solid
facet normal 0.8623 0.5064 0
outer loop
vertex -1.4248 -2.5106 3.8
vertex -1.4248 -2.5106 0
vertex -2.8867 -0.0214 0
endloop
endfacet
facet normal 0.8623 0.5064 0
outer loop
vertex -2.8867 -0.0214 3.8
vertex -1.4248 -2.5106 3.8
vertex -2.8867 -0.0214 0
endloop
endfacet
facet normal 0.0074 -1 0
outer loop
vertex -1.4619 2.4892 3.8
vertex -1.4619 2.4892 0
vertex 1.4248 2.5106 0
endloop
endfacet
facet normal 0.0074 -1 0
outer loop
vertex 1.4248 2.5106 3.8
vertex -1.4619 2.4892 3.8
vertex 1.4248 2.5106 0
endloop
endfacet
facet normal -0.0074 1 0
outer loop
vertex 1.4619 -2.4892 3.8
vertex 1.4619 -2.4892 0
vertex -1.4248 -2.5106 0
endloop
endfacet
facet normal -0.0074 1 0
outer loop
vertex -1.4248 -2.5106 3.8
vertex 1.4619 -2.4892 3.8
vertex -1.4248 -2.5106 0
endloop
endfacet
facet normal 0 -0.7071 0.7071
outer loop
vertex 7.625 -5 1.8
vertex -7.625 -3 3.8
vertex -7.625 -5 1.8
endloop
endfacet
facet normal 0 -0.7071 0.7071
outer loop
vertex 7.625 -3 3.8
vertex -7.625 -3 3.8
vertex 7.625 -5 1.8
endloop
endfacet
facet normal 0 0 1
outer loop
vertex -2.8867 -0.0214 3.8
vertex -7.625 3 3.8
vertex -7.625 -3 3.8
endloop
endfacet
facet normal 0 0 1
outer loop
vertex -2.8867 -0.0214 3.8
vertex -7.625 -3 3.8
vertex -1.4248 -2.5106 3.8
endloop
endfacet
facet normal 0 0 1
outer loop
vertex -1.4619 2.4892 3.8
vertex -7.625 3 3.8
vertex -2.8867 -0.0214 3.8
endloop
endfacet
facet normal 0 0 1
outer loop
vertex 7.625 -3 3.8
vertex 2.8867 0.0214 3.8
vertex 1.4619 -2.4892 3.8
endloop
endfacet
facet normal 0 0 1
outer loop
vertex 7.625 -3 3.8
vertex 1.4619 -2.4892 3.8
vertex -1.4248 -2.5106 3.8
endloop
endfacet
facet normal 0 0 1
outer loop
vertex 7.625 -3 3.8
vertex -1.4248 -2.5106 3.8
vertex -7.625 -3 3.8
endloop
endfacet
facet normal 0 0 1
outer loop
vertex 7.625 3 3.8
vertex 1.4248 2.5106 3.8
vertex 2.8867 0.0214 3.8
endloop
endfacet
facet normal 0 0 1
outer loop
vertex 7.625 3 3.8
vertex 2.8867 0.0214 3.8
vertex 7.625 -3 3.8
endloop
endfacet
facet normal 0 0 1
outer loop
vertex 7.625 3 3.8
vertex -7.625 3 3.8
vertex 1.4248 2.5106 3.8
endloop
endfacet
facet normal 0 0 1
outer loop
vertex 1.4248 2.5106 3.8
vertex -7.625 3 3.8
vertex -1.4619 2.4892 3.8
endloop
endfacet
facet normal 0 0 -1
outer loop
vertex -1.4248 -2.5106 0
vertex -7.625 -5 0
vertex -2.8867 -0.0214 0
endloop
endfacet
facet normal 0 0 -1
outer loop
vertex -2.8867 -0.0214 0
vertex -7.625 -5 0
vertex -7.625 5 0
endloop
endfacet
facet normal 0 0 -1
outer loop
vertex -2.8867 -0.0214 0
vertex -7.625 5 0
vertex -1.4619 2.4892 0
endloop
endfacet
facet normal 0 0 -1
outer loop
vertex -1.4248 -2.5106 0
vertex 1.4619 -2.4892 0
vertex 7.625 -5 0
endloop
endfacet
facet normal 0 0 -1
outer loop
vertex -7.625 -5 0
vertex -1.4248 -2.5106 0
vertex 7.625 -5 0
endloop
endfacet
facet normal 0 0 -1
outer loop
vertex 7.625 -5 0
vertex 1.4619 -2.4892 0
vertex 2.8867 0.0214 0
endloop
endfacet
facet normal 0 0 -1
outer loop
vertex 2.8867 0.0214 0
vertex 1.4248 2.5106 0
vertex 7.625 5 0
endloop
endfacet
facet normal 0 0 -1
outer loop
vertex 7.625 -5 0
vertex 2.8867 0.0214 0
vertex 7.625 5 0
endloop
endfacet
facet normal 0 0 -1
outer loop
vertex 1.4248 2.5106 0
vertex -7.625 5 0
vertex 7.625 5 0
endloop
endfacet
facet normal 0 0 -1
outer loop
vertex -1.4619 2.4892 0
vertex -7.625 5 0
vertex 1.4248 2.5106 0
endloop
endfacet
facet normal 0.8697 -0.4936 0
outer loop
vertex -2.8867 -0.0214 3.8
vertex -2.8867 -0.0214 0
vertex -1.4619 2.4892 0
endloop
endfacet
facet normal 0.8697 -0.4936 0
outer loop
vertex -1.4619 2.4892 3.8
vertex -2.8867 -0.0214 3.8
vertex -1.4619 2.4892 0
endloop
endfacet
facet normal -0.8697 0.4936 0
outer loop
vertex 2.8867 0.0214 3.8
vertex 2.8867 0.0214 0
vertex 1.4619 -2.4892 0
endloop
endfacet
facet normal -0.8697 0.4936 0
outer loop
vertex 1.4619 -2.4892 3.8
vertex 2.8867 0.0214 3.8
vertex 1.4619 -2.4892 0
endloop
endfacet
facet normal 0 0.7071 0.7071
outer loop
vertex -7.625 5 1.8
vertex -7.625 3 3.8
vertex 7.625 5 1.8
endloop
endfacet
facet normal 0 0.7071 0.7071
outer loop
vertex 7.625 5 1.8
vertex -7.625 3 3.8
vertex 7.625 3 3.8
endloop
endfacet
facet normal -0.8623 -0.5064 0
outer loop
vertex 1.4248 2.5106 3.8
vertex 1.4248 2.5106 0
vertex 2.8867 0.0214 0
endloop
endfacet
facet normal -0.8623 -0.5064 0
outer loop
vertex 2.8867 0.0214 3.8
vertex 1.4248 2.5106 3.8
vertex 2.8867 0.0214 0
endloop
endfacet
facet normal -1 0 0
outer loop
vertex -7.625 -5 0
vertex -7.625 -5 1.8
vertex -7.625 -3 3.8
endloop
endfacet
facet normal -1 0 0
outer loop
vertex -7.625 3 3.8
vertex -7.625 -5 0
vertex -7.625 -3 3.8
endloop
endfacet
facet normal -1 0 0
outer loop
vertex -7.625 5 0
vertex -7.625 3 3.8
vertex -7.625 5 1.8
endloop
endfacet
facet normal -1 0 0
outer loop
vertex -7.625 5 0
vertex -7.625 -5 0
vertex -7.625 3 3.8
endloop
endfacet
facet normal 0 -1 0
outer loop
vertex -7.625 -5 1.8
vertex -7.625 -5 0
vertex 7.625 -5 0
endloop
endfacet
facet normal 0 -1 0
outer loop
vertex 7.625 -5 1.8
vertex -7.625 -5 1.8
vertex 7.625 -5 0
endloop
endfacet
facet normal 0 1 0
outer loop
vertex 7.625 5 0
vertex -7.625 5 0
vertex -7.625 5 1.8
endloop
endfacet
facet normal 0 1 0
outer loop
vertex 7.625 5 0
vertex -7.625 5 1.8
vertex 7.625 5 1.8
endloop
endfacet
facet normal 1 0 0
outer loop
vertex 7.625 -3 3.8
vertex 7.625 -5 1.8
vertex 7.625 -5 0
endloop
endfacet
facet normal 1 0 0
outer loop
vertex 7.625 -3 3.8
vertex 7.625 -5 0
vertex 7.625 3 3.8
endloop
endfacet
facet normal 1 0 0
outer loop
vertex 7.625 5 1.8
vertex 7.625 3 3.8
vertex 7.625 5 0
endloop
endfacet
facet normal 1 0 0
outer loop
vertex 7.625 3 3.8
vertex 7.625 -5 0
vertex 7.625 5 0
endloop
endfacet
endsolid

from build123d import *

# Parameters (mm, degrees)
F0_W     = 15.25
F0_H     = 10
F1_DEPTH = 3.8
F2_SIZE2 = 2
F2_SIZE  = 2
F4_DEPTH = 4


with BuildPart() as f1:
    # F0 (on Top) → F1 (new body)
    with BuildSketch(Plane.XY):
        Rectangle(F0_W, F0_H)
    extrude(amount=F1_DEPTH)

    # F2
    f2_edges = [f1.edges().sort_by_distance(p)[0] for p in [
        (0, -5, 3.8),
        (0, 5, 3.8),
    ]]
    chamfer(f2_edges, length=F2_SIZE, length2=F2_SIZE2)

    # F3 (on face) → F4 (cut)
    with BuildSketch(Plane(origin=(0, 0, 0), x_dir=(1, 0, 0), z_dir=(0, 0, -1))):
        Polygon((1.424799, -2.510633), (2.886672, -0.021404), (1.461873, 2.489229), (-1.424799, 2.510633), (-2.886672, 0.021404), (-1.461873, -2.489229), align=None)
    extrude(amount=-F4_DEPTH, mode=Mode.SUBTRACT)


solid = f1.part
